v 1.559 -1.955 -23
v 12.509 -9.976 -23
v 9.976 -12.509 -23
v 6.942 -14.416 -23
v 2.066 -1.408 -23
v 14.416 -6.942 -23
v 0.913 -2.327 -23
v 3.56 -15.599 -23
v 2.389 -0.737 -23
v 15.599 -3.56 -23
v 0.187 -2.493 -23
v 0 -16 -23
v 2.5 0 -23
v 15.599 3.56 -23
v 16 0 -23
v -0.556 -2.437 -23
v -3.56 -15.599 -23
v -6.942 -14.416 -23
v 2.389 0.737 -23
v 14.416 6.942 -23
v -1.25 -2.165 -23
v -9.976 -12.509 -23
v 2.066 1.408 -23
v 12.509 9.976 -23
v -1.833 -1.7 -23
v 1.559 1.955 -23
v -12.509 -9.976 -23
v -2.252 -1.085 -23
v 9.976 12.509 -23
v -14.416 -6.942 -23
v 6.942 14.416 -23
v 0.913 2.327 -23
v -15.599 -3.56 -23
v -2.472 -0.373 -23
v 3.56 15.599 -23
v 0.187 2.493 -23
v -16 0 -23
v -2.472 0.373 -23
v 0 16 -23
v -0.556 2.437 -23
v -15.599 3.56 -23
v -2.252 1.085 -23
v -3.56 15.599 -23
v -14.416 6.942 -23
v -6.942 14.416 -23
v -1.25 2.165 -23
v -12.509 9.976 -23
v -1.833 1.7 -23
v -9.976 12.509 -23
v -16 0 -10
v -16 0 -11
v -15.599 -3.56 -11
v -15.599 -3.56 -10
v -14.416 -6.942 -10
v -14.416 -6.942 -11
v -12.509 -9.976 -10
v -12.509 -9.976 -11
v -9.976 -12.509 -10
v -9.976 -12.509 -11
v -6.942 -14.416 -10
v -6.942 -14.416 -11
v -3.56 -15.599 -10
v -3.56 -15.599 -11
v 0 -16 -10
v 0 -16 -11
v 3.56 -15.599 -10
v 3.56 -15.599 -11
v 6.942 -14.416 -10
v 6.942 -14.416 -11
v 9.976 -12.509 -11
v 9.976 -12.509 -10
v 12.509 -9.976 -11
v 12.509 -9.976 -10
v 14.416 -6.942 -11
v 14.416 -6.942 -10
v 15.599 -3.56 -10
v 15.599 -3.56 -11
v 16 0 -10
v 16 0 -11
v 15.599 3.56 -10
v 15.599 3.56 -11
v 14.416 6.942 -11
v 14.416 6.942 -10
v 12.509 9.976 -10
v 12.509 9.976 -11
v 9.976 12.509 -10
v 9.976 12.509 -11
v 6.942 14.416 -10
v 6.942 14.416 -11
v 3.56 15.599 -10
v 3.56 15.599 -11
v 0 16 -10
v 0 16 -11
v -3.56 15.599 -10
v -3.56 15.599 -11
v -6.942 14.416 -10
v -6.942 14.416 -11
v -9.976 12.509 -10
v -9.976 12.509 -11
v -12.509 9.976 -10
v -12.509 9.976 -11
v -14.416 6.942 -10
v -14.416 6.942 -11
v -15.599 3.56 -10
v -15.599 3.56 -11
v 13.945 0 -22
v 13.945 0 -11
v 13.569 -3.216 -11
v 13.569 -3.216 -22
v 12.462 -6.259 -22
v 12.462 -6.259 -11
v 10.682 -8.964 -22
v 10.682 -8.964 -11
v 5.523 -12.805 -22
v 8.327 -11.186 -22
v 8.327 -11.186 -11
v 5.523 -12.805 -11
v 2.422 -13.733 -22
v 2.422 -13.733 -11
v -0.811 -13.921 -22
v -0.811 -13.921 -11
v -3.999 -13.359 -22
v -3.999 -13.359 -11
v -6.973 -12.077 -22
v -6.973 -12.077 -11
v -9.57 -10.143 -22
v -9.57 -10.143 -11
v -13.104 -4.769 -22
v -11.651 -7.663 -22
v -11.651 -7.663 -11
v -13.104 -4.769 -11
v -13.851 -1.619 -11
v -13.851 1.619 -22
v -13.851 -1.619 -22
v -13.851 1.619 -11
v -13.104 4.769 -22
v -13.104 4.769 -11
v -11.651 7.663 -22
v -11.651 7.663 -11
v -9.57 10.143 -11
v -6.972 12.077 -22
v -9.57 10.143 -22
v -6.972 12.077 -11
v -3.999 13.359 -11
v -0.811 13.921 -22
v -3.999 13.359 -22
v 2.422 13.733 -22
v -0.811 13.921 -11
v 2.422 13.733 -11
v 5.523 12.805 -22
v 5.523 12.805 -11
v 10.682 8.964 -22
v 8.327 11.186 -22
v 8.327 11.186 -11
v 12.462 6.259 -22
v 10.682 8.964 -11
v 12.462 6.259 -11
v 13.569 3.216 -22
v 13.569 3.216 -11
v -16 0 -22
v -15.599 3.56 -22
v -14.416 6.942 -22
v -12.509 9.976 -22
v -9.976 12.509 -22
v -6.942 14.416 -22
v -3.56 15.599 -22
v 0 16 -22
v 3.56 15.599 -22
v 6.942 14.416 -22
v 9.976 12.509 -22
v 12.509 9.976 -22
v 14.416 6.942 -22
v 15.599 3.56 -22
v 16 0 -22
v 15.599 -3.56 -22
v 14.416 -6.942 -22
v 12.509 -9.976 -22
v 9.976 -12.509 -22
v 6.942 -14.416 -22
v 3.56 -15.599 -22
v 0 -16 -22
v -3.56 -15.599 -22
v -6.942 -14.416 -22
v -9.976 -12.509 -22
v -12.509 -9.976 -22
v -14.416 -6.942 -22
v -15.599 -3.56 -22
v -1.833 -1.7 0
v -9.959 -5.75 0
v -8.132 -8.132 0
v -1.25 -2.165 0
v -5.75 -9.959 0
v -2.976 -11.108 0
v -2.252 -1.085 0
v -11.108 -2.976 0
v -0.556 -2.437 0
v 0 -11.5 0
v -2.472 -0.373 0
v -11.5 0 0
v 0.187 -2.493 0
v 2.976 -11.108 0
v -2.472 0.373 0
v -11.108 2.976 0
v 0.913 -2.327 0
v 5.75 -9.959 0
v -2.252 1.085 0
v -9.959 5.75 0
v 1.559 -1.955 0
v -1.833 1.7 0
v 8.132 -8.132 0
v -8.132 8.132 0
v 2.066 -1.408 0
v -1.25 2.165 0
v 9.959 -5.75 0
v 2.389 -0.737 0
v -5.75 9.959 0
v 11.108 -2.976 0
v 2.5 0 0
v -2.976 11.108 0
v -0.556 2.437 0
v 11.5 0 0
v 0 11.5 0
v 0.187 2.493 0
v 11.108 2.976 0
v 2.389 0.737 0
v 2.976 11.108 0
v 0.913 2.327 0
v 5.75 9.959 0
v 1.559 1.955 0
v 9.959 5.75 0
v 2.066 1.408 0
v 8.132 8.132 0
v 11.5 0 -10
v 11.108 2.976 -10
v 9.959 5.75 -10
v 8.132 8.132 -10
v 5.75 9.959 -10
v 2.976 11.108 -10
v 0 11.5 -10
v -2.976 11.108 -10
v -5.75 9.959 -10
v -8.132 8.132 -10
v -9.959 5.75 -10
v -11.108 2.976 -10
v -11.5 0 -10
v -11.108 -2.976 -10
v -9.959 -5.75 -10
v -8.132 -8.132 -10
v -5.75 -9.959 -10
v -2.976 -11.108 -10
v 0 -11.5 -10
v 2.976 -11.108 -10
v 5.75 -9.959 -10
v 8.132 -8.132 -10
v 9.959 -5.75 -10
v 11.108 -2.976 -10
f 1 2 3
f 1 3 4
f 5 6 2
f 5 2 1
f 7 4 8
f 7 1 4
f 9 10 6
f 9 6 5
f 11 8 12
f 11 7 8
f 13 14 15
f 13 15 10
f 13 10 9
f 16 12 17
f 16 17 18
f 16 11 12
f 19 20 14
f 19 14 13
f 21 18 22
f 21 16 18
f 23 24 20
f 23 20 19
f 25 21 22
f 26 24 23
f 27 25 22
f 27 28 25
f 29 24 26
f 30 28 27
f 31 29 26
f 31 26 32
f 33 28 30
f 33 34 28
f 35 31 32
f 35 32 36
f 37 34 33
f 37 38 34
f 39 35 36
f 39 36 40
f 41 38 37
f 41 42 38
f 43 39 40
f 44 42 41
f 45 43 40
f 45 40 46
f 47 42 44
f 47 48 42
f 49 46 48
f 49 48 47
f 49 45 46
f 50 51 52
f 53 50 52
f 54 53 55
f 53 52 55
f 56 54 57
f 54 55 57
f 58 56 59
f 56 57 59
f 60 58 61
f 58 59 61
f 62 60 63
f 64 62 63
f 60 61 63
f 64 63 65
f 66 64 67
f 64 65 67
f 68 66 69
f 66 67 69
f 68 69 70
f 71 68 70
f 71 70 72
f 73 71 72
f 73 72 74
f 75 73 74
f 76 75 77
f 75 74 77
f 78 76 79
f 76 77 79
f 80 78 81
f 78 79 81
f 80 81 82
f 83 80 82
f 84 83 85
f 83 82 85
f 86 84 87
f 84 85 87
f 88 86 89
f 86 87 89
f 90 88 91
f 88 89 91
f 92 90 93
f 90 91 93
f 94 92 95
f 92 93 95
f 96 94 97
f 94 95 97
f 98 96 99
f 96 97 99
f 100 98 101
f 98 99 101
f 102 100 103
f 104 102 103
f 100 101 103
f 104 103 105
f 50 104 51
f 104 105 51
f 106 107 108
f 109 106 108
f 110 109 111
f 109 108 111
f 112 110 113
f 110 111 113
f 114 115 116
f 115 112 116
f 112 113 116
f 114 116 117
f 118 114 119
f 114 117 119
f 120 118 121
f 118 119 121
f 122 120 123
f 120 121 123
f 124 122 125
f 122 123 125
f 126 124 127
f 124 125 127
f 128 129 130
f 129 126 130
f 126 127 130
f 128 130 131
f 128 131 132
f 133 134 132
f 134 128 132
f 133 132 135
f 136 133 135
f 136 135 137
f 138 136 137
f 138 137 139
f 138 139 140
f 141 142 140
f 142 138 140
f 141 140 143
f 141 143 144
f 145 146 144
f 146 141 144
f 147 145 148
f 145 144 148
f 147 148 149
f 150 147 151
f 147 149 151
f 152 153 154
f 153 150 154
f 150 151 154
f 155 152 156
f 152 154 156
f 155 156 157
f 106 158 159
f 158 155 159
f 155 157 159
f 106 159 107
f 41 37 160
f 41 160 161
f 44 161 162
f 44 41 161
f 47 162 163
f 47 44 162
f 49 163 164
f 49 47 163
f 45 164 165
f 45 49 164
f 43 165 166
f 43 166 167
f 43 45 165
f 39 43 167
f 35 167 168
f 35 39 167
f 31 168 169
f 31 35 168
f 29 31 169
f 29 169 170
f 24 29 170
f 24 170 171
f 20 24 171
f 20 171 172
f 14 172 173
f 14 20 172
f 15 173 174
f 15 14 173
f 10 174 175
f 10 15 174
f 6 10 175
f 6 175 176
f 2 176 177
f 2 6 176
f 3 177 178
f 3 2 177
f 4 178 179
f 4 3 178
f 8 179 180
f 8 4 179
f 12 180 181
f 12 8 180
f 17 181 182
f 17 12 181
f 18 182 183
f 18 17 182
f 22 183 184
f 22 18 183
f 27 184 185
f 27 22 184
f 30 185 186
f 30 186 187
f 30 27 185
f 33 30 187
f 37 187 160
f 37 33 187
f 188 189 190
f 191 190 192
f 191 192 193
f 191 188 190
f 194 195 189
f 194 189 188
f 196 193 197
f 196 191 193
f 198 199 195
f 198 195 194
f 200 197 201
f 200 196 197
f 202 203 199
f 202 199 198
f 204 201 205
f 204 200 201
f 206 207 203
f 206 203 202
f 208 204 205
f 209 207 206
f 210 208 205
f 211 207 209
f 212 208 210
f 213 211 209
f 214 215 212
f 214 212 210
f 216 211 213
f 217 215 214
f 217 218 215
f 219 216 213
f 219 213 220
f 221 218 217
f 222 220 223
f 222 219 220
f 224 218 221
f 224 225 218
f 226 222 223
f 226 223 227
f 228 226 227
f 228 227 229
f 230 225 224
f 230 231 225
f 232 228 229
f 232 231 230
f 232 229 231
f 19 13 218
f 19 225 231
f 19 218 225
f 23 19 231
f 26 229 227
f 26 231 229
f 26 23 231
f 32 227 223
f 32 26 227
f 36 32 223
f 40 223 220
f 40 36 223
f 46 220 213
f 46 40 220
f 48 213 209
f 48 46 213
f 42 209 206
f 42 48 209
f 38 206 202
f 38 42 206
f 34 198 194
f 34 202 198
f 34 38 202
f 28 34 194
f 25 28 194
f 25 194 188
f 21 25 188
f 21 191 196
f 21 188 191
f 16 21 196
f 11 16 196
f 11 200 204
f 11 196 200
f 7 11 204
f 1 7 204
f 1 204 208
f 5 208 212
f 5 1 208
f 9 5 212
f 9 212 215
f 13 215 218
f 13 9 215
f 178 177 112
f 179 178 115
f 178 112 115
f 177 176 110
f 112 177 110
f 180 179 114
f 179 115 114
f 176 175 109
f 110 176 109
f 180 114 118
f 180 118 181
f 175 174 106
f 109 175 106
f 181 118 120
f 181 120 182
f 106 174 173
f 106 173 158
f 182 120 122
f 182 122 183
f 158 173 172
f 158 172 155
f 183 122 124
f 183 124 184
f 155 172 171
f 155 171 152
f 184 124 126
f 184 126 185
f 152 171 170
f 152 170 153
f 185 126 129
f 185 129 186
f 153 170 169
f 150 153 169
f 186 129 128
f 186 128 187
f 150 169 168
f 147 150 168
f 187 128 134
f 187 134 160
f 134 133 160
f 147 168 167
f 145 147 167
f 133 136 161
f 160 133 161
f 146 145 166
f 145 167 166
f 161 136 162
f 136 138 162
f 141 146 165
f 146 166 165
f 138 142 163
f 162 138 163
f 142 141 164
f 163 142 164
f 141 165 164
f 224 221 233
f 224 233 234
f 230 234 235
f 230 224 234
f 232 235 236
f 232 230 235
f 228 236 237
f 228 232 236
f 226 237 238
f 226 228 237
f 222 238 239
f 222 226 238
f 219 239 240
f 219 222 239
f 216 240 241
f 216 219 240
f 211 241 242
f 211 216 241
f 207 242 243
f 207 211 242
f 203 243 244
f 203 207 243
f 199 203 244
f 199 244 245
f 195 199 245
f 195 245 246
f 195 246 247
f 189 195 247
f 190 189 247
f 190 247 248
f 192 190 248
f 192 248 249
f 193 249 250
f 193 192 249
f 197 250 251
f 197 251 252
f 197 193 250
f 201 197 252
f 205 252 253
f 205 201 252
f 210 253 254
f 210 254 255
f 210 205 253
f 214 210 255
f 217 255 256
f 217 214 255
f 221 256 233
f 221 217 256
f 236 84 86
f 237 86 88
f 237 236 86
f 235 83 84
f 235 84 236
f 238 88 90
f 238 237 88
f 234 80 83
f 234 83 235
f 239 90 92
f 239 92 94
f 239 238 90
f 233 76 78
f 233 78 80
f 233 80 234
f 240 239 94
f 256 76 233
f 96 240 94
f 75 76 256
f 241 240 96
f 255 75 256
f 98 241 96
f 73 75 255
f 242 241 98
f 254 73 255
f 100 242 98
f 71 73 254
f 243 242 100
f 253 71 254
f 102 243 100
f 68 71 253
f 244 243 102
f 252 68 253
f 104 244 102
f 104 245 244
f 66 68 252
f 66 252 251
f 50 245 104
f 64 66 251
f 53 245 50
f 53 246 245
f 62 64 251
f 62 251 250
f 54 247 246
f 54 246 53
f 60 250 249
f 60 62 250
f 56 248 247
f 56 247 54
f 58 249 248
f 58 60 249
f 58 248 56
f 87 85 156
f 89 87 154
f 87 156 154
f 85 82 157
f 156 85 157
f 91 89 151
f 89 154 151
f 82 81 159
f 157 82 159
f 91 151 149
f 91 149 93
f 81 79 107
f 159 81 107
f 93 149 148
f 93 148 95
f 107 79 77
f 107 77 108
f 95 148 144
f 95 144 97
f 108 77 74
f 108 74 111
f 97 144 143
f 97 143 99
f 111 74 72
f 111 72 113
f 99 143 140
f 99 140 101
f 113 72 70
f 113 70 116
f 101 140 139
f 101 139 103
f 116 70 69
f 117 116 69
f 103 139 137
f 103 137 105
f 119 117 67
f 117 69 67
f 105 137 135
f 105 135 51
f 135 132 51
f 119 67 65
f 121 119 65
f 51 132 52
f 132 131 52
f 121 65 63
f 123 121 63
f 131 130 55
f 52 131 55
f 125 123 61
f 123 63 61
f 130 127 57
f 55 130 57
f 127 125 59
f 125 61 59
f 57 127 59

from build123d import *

# Parameters (mm, degrees)
SKETCH_1_R               = 11.5
EXTRUDE_1_DEPTH          = 10
SKETCH_2_R               = 13.945
EXTRUDE_2_DEPTH          = 13
SKETCH_3_R               = 16
EXTRUDE_3_DEPTH          = 1
EXTRUDE_START            = -1
SKETCH_4_R               = 16
EXTRUDE_4_DEPTH          = 1
CUT_EXTRUDE_1_DEPTH      = 33.26453161
CUT_EXTRUDE_1_DEPTH_BACK = 33.26453161
SKETCH_5_R               = 2.5


with BuildPart() as part:
    # 草图1 → 凸台-拉伸1 (new body)
    with BuildSketch(Plane.XY):
        Circle(SKETCH_1_R)
    extrude(amount=-EXTRUDE_1_DEPTH)

    # 草图2 → 凸台-拉伸2 (add)
    with BuildSketch(Plane(origin=(0, 0, -10), x_dir=(-1, 0, 0), z_dir=(0, 0, -1))):
        with Locations(Location((0, 0, 0), (0, 0, 180))):
            Circle(SKETCH_2_R)
    extrude(amount=EXTRUDE_2_DEPTH)

    # 草图3 → 凸台-拉伸3 (add)
    with BuildSketch(Plane(origin=(0, 0, -23), x_dir=(-1, 0, 0), z_dir=(0, 0, -1))):
        Circle(SKETCH_3_R)
    extrude(amount=-EXTRUDE_3_DEPTH)

    # 草图4 → 凸台-拉伸4 (add)
    with BuildSketch(Plane.XY.offset(-10).offset(EXTRUDE_START)):
        with Locations(Location((0, 0, 0), (0, 0, 180))):
            Circle(SKETCH_4_R)
    extrude(amount=EXTRUDE_4_DEPTH)

    # 草图5 → 切除-拉伸1 (cut, two sides: drawn at the far end of the back side and taken through both)
    with BuildSketch(Plane.XY.offset(-CUT_EXTRUDE_1_DEPTH_BACK)):
        Circle(SKETCH_5_R)
    extrude(amount=CUT_EXTRUDE_1_DEPTH + CUT_EXTRUDE_1_DEPTH_BACK, mode=Mode.SUBTRACT)


solid = part.part
